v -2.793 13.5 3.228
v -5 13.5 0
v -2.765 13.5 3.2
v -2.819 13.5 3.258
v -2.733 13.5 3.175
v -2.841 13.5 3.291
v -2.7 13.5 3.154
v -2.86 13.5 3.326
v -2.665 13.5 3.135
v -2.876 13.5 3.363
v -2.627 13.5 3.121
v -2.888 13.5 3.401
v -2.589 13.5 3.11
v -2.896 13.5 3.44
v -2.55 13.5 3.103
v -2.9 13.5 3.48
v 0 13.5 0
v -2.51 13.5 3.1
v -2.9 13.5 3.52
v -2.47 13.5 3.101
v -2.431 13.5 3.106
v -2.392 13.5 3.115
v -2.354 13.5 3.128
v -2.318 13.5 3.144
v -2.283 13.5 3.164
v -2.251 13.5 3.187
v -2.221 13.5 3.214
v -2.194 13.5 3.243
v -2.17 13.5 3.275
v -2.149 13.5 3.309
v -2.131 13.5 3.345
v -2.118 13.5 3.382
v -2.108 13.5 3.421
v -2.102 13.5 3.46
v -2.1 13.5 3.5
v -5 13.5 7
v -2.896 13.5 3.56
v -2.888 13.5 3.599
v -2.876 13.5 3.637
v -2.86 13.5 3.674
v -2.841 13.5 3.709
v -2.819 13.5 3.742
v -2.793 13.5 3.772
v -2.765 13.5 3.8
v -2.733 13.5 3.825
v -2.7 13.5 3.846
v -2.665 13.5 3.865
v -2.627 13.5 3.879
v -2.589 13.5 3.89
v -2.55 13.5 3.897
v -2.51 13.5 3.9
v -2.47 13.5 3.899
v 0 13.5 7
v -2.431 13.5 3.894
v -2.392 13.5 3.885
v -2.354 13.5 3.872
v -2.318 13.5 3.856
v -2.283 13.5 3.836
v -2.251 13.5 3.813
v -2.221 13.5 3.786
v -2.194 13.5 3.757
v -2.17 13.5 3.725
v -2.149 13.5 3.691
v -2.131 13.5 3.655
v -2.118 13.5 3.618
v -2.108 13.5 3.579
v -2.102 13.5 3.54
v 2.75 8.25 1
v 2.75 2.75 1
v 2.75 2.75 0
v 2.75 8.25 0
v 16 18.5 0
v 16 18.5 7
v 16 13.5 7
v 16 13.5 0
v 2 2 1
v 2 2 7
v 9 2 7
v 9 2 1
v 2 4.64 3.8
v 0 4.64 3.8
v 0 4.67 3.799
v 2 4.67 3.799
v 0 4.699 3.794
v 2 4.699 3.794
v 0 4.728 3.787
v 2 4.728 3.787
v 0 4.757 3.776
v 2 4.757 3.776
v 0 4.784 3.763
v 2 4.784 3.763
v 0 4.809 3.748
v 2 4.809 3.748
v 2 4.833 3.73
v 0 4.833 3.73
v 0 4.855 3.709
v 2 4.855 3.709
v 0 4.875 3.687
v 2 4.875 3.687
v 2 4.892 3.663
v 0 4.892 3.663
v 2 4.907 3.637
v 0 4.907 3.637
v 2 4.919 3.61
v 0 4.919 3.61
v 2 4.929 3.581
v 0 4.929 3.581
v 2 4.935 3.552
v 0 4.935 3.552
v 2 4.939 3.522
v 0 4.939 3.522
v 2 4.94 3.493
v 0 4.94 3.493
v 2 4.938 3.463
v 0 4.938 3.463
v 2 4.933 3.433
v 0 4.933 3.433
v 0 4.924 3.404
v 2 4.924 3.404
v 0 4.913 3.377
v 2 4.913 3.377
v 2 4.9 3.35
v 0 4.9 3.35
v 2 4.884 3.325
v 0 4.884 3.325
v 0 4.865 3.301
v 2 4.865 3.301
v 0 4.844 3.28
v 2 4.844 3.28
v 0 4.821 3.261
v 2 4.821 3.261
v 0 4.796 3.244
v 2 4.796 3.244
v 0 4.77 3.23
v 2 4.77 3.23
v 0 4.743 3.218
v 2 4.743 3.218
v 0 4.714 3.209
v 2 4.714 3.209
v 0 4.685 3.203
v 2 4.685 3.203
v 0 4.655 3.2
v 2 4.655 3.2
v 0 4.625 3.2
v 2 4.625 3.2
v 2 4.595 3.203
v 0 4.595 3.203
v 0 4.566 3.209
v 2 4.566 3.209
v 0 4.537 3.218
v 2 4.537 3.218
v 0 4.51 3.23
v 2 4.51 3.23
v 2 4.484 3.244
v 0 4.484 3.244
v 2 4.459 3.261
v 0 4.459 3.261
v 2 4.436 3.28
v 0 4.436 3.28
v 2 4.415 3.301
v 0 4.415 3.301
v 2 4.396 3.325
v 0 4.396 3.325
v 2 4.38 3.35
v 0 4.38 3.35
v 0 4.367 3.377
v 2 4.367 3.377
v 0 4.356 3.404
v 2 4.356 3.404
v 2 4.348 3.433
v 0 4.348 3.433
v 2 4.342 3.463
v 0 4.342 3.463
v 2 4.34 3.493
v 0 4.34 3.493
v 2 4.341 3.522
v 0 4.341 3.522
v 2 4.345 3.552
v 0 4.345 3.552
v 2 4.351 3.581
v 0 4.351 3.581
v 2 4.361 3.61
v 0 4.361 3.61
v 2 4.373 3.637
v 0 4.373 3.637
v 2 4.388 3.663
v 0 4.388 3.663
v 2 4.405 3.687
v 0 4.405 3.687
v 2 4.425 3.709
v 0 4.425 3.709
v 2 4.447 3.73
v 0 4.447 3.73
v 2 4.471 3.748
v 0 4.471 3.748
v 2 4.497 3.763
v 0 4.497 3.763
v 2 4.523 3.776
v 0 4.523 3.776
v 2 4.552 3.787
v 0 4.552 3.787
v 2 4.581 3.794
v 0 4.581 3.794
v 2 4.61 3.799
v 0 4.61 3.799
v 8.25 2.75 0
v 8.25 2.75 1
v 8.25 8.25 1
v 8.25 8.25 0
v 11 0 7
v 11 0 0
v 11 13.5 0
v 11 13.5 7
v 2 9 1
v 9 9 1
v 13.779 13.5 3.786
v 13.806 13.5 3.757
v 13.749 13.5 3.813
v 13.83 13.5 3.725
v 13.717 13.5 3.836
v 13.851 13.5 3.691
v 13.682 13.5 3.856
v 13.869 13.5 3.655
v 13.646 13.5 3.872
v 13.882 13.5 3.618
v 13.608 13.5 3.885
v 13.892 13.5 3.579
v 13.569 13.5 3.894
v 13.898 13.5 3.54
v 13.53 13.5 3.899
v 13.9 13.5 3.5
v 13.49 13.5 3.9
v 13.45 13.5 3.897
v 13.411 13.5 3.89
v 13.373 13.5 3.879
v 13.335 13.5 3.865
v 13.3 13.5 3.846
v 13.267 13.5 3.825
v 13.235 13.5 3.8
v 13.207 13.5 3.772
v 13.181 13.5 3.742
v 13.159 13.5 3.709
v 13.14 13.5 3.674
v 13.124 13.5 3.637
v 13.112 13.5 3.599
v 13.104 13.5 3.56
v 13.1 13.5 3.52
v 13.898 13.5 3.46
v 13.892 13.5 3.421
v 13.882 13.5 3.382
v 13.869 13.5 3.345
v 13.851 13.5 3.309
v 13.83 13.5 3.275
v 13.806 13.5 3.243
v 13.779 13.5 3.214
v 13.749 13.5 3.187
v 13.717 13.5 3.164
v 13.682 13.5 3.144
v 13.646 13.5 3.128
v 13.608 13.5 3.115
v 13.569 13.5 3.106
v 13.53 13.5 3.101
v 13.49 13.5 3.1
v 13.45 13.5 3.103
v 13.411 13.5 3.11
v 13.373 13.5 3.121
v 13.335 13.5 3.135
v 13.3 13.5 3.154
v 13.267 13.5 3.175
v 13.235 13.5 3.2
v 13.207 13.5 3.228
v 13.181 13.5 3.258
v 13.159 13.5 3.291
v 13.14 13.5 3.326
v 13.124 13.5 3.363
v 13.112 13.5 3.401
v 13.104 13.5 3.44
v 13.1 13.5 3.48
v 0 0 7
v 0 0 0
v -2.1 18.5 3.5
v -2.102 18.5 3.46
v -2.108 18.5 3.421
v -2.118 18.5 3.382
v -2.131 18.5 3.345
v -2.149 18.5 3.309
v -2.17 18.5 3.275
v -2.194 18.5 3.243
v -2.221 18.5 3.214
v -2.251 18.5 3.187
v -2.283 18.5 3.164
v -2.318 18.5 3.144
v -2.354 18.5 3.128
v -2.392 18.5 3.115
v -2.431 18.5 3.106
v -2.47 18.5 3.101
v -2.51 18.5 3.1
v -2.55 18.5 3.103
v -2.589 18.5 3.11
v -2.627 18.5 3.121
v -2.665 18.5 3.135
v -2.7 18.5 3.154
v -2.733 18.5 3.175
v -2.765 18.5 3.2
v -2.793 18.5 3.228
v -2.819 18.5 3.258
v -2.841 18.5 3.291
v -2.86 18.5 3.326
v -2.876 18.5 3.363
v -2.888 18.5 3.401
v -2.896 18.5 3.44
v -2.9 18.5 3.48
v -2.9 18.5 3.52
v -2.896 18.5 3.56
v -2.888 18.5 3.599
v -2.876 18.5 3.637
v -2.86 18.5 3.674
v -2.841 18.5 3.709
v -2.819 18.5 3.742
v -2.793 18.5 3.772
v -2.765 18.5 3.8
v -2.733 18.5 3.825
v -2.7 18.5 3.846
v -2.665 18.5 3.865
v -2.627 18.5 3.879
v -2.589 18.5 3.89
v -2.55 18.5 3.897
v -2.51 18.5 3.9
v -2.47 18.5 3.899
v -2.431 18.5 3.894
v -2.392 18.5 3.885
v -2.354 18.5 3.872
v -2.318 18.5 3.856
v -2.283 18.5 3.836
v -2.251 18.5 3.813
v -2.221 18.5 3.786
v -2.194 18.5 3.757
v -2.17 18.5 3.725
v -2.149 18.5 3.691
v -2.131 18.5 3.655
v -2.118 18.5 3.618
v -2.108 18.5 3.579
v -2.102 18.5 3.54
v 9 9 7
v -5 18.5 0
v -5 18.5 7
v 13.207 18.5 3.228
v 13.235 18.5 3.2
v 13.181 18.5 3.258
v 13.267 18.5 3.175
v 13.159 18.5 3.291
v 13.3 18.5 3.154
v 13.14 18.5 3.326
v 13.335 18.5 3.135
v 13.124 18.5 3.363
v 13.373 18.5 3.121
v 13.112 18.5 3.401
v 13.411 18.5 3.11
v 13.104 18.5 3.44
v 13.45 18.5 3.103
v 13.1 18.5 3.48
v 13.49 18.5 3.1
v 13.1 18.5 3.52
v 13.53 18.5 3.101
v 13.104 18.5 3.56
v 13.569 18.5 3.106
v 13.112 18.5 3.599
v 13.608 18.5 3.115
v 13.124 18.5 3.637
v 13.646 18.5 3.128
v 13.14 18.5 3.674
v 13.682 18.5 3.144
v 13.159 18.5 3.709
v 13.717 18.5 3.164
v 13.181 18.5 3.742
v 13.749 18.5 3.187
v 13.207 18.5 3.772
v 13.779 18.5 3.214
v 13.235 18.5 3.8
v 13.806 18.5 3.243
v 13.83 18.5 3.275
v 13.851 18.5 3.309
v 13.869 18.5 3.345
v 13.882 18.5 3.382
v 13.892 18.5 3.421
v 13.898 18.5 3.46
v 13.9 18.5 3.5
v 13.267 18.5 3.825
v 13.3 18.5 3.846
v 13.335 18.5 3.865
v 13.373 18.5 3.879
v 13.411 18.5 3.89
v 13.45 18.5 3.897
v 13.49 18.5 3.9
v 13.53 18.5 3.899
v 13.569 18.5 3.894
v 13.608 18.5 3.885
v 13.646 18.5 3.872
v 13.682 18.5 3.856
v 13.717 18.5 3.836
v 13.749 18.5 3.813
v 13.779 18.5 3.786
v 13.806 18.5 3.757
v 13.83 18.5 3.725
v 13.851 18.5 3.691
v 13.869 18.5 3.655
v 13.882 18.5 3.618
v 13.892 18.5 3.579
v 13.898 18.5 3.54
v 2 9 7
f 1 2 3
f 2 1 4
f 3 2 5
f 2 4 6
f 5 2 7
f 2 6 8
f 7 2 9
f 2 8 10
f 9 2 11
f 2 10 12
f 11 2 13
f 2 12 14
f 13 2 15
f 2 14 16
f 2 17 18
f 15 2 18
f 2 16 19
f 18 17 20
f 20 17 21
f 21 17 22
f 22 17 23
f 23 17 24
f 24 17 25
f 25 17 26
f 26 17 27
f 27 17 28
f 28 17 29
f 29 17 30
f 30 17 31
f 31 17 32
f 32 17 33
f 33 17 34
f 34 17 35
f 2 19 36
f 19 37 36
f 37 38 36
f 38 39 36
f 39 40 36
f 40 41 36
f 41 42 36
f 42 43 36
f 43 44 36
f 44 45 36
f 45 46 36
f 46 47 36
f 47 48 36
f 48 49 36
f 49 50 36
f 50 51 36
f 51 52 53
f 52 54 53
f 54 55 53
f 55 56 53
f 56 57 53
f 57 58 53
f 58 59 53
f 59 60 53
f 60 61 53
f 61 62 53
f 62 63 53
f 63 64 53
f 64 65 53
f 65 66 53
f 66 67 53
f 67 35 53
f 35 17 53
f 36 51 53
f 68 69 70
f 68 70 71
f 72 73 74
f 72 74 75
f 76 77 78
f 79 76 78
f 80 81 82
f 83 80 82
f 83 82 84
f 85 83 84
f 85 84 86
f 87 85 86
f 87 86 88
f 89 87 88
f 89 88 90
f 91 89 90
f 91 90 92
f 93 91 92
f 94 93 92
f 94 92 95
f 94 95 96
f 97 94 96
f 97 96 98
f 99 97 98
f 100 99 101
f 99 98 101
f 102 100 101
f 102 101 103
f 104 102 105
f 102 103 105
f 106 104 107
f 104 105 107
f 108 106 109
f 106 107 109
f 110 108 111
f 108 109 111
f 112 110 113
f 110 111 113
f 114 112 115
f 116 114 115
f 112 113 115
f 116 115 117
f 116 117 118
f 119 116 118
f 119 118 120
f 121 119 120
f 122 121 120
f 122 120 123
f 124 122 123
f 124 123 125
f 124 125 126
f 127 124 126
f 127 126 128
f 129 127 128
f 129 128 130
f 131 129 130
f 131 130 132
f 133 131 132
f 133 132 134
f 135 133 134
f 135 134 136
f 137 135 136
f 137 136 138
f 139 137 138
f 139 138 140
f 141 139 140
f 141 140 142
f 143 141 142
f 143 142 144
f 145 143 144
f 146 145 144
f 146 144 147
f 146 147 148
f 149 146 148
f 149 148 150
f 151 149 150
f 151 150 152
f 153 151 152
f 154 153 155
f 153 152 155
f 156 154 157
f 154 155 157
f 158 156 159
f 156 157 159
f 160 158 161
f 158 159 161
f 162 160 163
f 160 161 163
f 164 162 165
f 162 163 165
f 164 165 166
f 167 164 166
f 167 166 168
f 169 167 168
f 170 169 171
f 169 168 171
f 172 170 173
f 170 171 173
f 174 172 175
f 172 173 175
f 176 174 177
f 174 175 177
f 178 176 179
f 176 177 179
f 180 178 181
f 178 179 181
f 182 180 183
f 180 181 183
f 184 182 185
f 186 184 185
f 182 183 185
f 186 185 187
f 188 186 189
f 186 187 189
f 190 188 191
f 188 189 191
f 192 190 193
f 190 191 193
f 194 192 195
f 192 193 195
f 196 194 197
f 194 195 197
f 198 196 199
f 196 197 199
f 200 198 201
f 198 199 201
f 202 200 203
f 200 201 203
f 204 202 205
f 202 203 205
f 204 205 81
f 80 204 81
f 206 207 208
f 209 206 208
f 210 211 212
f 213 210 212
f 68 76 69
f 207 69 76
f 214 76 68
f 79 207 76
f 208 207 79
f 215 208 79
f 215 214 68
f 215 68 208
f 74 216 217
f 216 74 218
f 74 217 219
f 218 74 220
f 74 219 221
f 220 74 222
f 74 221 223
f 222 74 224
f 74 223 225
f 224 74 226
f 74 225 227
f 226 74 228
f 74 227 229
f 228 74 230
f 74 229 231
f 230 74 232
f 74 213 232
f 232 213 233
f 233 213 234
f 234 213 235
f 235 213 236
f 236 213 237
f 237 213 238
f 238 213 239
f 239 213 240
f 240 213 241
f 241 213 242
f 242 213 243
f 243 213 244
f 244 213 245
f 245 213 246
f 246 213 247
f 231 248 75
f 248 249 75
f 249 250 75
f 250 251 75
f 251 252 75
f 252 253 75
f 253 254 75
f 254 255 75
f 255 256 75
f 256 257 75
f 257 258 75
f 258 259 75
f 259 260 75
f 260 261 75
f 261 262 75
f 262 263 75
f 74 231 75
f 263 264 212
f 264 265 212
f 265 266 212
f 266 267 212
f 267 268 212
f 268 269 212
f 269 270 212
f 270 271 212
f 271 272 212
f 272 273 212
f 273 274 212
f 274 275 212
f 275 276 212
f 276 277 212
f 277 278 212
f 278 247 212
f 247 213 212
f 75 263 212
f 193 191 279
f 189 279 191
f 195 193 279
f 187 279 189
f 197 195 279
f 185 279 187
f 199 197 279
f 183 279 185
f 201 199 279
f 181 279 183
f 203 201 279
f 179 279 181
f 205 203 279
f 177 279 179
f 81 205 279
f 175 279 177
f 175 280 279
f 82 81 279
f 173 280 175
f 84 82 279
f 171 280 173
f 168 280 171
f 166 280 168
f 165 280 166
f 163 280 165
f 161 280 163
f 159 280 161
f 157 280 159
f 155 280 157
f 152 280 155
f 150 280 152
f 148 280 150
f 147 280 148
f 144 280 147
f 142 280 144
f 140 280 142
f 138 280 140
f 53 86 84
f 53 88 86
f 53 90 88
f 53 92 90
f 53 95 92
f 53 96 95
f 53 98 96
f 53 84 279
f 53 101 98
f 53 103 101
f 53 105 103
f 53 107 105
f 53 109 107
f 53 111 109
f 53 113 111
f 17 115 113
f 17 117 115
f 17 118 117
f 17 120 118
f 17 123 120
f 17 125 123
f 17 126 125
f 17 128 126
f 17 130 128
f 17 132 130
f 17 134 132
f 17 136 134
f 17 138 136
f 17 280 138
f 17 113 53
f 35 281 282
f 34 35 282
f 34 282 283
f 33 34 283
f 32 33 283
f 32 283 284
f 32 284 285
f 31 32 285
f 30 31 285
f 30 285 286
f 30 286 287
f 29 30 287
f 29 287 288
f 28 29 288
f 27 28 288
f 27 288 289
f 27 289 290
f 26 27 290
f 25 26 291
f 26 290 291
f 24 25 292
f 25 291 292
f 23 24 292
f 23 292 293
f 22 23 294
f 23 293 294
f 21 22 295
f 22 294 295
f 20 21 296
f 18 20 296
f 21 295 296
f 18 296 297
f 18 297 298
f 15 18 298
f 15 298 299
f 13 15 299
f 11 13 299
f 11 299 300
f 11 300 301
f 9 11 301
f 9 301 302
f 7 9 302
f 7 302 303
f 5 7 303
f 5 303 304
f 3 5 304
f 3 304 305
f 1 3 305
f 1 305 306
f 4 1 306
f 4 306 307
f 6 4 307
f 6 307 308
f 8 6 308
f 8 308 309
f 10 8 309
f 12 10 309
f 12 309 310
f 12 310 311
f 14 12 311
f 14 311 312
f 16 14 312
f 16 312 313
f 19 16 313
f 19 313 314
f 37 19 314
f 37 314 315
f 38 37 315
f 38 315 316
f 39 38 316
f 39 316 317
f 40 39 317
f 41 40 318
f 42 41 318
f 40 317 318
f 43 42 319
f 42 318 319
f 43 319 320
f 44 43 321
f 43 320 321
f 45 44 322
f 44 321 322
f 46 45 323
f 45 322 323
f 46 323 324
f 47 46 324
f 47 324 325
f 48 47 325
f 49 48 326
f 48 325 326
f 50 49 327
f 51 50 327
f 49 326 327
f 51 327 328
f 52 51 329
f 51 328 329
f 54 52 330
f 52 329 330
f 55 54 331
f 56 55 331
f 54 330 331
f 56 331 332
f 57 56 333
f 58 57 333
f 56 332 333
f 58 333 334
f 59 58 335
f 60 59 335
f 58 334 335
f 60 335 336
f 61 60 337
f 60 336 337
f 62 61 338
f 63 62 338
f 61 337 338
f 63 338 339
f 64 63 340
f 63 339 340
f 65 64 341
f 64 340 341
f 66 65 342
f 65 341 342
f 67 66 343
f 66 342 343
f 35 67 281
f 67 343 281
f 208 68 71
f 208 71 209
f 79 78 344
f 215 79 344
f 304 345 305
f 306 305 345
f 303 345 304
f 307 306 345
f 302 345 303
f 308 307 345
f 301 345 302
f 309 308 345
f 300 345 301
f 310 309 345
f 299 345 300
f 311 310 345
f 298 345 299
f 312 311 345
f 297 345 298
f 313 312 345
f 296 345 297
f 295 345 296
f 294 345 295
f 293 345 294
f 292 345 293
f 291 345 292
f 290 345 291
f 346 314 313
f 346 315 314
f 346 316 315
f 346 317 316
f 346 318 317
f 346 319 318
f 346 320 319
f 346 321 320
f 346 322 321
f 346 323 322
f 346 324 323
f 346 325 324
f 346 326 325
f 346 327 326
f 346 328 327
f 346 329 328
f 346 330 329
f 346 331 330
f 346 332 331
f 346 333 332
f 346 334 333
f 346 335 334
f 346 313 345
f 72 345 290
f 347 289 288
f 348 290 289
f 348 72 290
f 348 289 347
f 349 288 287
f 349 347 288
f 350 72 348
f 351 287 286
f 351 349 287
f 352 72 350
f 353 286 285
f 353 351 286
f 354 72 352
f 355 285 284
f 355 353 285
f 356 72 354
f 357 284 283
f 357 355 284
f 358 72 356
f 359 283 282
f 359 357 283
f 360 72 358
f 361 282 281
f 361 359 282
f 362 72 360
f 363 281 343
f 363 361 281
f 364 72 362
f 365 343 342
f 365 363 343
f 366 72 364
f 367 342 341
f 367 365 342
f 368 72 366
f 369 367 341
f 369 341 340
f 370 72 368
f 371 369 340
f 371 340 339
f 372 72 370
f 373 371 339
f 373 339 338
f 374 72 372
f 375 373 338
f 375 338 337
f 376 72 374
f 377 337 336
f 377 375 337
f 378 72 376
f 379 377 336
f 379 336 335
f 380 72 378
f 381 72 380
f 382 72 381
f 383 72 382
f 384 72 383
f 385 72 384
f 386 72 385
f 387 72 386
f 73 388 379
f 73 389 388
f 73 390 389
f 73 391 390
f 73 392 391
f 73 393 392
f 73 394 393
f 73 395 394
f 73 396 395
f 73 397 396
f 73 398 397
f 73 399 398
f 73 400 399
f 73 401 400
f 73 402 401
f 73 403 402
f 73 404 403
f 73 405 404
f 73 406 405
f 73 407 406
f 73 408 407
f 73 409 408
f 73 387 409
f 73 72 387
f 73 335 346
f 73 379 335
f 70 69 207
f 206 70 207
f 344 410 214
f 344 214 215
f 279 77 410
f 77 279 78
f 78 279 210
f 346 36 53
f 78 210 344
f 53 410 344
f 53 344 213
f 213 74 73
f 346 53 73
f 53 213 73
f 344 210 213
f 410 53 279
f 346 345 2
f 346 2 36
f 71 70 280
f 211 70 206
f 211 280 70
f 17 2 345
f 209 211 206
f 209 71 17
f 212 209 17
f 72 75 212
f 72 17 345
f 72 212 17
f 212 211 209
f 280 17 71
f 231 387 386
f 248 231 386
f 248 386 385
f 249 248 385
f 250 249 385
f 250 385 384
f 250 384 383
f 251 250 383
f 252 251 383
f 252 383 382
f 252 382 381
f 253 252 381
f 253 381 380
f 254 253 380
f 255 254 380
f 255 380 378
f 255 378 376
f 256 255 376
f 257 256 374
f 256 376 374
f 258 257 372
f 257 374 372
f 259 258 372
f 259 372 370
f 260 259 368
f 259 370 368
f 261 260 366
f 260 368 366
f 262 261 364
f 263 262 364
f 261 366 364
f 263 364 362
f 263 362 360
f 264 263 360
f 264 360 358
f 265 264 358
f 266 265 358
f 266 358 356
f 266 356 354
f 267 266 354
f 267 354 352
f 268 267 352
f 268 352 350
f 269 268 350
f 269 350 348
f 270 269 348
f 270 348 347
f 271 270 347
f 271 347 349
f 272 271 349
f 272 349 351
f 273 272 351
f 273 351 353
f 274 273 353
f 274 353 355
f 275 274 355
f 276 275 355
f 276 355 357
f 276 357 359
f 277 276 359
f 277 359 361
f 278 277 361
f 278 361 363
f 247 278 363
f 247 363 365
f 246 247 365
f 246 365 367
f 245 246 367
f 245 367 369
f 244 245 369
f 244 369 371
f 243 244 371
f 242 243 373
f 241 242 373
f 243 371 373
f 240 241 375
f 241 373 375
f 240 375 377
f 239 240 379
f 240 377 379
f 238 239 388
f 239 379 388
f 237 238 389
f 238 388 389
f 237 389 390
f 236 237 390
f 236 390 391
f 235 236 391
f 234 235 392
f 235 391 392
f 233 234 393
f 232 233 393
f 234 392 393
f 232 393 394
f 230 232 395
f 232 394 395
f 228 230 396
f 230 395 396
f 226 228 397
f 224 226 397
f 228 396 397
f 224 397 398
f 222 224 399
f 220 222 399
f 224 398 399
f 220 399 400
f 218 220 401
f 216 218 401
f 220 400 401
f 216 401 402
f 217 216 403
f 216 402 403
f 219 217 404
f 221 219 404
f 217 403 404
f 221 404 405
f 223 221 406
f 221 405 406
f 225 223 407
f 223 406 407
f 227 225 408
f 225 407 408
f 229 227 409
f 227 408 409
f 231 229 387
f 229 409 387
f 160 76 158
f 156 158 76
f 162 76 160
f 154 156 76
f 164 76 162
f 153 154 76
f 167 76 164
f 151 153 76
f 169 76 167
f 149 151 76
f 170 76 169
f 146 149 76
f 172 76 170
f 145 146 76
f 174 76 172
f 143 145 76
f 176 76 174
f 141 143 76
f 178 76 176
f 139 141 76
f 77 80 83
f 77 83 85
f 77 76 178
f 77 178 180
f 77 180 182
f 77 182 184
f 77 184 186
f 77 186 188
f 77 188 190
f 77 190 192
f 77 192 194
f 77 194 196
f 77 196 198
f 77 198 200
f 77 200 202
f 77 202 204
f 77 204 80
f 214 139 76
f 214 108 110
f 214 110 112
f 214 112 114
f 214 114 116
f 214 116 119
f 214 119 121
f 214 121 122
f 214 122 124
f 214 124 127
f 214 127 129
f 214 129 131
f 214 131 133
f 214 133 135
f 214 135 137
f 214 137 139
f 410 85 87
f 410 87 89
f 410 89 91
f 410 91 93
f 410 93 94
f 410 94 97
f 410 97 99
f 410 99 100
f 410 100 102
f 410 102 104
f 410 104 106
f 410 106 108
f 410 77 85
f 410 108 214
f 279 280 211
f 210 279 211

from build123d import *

# Parameters (mm, degrees)
ESQUISSE1_W             = 11
ESQUISSE1_H             = 18.5
BOSS_EXTRU_1_DEPTH      = 7
ESQUISSE2_W             = 7
ESQUISSE2_H             = 7
ENL_V_MAT_EXTRU_1_DEPTH = 6
ESQUISSE4_W             = 5.5
ESQUISSE4_H             = 5.5
ENL_V_MAT_EXTRU_2_DEPTH = 10
ENL_V_MAT_EXTRU_3_REACH = 13
ESQUISSE5_R             = 0.3
ESQUISSE7_W             = 7
ESQUISSE7_H             = 5
BOSS_EXTRU_2_DEPTH      = 5
ESQUISSE8_W             = 7
ESQUISSE8_H             = 5
BOSS_EXTRU_3_DEPTH      = 5
ESQUISSE9_R             = 0.4
ENL_V_MAT_EXTRU_4_DEPTH = 19.5


with BuildPart() as part:
    # Esquisse1 → Boss.-Extru.1 (new body)
    with BuildSketch(Plane.XY):
        with Locations((5.5, 9.25)):
            Rectangle(ESQUISSE1_W, ESQUISSE1_H)
    extrude(amount=BOSS_EXTRU_1_DEPTH)

    # Esquisse2 → Enlèv. mat.-Extru.1 (cut)
    with BuildSketch(Plane.XY.offset(7)):
        with Locations((5.5, 5.5)):
            Rectangle(ESQUISSE2_W, ESQUISSE2_H)
    extrude(amount=-ENL_V_MAT_EXTRU_1_DEPTH, mode=Mode.SUBTRACT)

    # Esquisse4 → Enlèv. mat.-Extru.2 (cut)
    with BuildSketch(Plane.XY.offset(1)):
        with Locations((5.5, 5.5)):
            Rectangle(ESQUISSE4_W, ESQUISSE4_H)
    extrude(amount=-ENL_V_MAT_EXTRU_2_DEPTH, mode=Mode.SUBTRACT)

    # Esquisse5 → Enlèv. mat.-Extru.3 (cut, up to next)
    with BuildSketch(Plane.ZY, mode=Mode.PRIVATE) as enl_v_mat_extru_3_sk1:
        with Locations((3.5, 4.640028524)):
            Circle(ESQUISSE5_R)
    enl_v_mat_extru_3_tool1 = extrude(enl_v_mat_extru_3_sk1.sketch, amount=-ENL_V_MAT_EXTRU_3_REACH, mode=Mode.PRIVATE) & part.part
    add(enl_v_mat_extru_3_tool1.solids().sort_by_distance((0, 4.640029, 3.5))[0], mode=Mode.SUBTRACT)

    # Esquisse7 → Boss.-Extru.2 (add)
    with BuildSketch(Plane(origin=(11, 0, 0), x_dir=(0, 0, -1), z_dir=(1, 0, 0))):
        with Locations((-3.5, 16)):
            Rectangle(ESQUISSE7_W, ESQUISSE7_H)
    extrude(amount=BOSS_EXTRU_2_DEPTH)

    # Esquisse8 → Boss.-Extru.3 (add)
    with BuildSketch(Plane.ZY):
        with Locations((3.5, 16)):
            Rectangle(ESQUISSE8_W, ESQUISSE8_H)
    extrude(amount=BOSS_EXTRU_3_DEPTH)

    # Esquisse9 → Enlèv. mat.-Extru.4 (cut, through all)
    with BuildSketch(Plane(origin=(0, 18.5, 0), x_dir=(1, 0, 0), z_dir=(0, 1, 0))):
        with Locations((-2.5, -3.5)):
            Circle(ESQUISSE9_R)
        with Locations((13.5, -3.5)):
            Circle(ESQUISSE9_R)
    extrude(amount=-ENL_V_MAT_EXTRU_4_DEPTH, mode=Mode.SUBTRACT)


solid = part.part
